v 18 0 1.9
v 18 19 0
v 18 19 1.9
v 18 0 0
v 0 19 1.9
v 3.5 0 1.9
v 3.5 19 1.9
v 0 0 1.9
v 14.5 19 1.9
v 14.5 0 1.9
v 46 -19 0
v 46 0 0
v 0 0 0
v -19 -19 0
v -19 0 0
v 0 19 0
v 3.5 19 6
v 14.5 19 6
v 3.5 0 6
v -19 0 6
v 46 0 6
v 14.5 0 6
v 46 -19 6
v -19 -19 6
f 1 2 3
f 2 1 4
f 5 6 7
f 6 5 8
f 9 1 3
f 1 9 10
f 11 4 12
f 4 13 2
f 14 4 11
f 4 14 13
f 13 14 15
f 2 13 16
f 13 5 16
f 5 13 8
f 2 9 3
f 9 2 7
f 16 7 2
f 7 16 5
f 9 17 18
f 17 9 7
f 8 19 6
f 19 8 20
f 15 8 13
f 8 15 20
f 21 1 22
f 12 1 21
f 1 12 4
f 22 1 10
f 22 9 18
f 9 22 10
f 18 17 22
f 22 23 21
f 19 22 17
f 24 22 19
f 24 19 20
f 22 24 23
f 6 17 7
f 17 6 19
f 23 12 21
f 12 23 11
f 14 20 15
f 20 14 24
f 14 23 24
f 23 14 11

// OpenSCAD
 //cube([60,30,200], true);
cube([18,19,1.9]);

translate([3.5,0,0])
cube([11,19,6]);

translate([-19,-19,0])
cube([65,19,6]);
